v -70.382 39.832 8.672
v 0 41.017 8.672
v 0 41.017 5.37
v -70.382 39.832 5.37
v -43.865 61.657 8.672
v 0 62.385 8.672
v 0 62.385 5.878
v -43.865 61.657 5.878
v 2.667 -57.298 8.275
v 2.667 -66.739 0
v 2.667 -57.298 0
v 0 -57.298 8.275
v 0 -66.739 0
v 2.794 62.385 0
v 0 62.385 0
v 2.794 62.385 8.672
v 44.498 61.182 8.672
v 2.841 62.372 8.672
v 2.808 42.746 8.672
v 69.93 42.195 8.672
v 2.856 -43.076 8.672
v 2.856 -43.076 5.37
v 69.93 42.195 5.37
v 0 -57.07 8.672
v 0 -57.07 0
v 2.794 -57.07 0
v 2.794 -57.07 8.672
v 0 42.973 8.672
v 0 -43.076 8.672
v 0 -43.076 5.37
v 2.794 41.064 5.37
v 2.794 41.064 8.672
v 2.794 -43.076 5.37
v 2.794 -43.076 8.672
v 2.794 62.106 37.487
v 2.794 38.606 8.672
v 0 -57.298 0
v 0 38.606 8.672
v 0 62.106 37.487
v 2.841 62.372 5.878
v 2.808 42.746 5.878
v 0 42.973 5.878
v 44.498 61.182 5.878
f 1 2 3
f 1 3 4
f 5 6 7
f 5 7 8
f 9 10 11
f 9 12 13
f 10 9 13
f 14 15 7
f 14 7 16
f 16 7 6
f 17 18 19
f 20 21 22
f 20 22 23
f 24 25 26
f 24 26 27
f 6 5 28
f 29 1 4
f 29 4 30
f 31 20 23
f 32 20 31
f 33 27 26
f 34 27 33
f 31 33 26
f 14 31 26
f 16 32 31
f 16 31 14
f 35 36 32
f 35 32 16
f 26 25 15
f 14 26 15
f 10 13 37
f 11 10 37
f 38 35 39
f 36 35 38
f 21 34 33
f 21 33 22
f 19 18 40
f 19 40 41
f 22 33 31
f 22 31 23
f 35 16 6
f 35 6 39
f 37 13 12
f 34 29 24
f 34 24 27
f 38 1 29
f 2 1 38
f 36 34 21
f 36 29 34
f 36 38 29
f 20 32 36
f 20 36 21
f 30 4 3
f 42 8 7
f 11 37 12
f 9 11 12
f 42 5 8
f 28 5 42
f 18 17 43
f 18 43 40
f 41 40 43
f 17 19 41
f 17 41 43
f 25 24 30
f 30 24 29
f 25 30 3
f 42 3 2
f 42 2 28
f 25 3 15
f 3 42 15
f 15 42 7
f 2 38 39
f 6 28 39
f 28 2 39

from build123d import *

# Parameters (mm, degrees)
F0_W      = 119.455494
F0_H      = 8.672412
F2_DEPTH  = 2.794
F3_DEPTH  = 2.667
F8_DEPTH  = 3.302
F9_DEPTH  = 2.794
F10_DEPTH = 2.794


with BuildPart() as f2:
    # F0 (on Right) → F2 (new body)
    with BuildSketch(Plane.YZ):
        with Locations((2.657678, 4.336206)):
            Rectangle(F0_W, F0_H)
    extrude(amount=F2_DEPTH)

    # F7 (on face) → F8 (join)
    with BuildSketch(Plane.XY.offset(8.672412)):
        Polygon((0, -43.076165), (2.856444, -43.076165), (69.93027, 42.195044), (-70.381574, 39.831895), align=None)
    extrude(amount=-F8_DEPTH)

    # F6 (on face) + F4 (on face) → F9 (join)
    with BuildSketch(Plane.XY.offset(8.672412)):
        Polygon((2.841048, 62.372476), (2.807627, 42.746466), (44.497889, 61.182428), align=None)
    with BuildSketch(Plane.XY.offset(8.672412)):
        Polygon((-43.864887, 61.656576), (0, 42.973131), (0, 62.385425), align=None)
    extrude(amount=-F9_DEPTH)

    # F5 (on face) → F10 (join)
    with BuildSketch(Plane.YZ.offset(2.794)):
        Polygon((62.105671, 37.487201), (38.606223, 8.672412), (62.385425, 8.672412), align=None)
    extrude(amount=-F10_DEPTH)


with BuildPart() as f3:
    # F1 (on Right) → F3 (new body)
    with BuildSketch(Plane.YZ):
        Polygon((-57.298489, 0), (-57.298489, 8.274693), (-66.738687, 0), align=None)
    extrude(amount=F3_DEPTH)


solid = Compound([f2.part, f3.part])
